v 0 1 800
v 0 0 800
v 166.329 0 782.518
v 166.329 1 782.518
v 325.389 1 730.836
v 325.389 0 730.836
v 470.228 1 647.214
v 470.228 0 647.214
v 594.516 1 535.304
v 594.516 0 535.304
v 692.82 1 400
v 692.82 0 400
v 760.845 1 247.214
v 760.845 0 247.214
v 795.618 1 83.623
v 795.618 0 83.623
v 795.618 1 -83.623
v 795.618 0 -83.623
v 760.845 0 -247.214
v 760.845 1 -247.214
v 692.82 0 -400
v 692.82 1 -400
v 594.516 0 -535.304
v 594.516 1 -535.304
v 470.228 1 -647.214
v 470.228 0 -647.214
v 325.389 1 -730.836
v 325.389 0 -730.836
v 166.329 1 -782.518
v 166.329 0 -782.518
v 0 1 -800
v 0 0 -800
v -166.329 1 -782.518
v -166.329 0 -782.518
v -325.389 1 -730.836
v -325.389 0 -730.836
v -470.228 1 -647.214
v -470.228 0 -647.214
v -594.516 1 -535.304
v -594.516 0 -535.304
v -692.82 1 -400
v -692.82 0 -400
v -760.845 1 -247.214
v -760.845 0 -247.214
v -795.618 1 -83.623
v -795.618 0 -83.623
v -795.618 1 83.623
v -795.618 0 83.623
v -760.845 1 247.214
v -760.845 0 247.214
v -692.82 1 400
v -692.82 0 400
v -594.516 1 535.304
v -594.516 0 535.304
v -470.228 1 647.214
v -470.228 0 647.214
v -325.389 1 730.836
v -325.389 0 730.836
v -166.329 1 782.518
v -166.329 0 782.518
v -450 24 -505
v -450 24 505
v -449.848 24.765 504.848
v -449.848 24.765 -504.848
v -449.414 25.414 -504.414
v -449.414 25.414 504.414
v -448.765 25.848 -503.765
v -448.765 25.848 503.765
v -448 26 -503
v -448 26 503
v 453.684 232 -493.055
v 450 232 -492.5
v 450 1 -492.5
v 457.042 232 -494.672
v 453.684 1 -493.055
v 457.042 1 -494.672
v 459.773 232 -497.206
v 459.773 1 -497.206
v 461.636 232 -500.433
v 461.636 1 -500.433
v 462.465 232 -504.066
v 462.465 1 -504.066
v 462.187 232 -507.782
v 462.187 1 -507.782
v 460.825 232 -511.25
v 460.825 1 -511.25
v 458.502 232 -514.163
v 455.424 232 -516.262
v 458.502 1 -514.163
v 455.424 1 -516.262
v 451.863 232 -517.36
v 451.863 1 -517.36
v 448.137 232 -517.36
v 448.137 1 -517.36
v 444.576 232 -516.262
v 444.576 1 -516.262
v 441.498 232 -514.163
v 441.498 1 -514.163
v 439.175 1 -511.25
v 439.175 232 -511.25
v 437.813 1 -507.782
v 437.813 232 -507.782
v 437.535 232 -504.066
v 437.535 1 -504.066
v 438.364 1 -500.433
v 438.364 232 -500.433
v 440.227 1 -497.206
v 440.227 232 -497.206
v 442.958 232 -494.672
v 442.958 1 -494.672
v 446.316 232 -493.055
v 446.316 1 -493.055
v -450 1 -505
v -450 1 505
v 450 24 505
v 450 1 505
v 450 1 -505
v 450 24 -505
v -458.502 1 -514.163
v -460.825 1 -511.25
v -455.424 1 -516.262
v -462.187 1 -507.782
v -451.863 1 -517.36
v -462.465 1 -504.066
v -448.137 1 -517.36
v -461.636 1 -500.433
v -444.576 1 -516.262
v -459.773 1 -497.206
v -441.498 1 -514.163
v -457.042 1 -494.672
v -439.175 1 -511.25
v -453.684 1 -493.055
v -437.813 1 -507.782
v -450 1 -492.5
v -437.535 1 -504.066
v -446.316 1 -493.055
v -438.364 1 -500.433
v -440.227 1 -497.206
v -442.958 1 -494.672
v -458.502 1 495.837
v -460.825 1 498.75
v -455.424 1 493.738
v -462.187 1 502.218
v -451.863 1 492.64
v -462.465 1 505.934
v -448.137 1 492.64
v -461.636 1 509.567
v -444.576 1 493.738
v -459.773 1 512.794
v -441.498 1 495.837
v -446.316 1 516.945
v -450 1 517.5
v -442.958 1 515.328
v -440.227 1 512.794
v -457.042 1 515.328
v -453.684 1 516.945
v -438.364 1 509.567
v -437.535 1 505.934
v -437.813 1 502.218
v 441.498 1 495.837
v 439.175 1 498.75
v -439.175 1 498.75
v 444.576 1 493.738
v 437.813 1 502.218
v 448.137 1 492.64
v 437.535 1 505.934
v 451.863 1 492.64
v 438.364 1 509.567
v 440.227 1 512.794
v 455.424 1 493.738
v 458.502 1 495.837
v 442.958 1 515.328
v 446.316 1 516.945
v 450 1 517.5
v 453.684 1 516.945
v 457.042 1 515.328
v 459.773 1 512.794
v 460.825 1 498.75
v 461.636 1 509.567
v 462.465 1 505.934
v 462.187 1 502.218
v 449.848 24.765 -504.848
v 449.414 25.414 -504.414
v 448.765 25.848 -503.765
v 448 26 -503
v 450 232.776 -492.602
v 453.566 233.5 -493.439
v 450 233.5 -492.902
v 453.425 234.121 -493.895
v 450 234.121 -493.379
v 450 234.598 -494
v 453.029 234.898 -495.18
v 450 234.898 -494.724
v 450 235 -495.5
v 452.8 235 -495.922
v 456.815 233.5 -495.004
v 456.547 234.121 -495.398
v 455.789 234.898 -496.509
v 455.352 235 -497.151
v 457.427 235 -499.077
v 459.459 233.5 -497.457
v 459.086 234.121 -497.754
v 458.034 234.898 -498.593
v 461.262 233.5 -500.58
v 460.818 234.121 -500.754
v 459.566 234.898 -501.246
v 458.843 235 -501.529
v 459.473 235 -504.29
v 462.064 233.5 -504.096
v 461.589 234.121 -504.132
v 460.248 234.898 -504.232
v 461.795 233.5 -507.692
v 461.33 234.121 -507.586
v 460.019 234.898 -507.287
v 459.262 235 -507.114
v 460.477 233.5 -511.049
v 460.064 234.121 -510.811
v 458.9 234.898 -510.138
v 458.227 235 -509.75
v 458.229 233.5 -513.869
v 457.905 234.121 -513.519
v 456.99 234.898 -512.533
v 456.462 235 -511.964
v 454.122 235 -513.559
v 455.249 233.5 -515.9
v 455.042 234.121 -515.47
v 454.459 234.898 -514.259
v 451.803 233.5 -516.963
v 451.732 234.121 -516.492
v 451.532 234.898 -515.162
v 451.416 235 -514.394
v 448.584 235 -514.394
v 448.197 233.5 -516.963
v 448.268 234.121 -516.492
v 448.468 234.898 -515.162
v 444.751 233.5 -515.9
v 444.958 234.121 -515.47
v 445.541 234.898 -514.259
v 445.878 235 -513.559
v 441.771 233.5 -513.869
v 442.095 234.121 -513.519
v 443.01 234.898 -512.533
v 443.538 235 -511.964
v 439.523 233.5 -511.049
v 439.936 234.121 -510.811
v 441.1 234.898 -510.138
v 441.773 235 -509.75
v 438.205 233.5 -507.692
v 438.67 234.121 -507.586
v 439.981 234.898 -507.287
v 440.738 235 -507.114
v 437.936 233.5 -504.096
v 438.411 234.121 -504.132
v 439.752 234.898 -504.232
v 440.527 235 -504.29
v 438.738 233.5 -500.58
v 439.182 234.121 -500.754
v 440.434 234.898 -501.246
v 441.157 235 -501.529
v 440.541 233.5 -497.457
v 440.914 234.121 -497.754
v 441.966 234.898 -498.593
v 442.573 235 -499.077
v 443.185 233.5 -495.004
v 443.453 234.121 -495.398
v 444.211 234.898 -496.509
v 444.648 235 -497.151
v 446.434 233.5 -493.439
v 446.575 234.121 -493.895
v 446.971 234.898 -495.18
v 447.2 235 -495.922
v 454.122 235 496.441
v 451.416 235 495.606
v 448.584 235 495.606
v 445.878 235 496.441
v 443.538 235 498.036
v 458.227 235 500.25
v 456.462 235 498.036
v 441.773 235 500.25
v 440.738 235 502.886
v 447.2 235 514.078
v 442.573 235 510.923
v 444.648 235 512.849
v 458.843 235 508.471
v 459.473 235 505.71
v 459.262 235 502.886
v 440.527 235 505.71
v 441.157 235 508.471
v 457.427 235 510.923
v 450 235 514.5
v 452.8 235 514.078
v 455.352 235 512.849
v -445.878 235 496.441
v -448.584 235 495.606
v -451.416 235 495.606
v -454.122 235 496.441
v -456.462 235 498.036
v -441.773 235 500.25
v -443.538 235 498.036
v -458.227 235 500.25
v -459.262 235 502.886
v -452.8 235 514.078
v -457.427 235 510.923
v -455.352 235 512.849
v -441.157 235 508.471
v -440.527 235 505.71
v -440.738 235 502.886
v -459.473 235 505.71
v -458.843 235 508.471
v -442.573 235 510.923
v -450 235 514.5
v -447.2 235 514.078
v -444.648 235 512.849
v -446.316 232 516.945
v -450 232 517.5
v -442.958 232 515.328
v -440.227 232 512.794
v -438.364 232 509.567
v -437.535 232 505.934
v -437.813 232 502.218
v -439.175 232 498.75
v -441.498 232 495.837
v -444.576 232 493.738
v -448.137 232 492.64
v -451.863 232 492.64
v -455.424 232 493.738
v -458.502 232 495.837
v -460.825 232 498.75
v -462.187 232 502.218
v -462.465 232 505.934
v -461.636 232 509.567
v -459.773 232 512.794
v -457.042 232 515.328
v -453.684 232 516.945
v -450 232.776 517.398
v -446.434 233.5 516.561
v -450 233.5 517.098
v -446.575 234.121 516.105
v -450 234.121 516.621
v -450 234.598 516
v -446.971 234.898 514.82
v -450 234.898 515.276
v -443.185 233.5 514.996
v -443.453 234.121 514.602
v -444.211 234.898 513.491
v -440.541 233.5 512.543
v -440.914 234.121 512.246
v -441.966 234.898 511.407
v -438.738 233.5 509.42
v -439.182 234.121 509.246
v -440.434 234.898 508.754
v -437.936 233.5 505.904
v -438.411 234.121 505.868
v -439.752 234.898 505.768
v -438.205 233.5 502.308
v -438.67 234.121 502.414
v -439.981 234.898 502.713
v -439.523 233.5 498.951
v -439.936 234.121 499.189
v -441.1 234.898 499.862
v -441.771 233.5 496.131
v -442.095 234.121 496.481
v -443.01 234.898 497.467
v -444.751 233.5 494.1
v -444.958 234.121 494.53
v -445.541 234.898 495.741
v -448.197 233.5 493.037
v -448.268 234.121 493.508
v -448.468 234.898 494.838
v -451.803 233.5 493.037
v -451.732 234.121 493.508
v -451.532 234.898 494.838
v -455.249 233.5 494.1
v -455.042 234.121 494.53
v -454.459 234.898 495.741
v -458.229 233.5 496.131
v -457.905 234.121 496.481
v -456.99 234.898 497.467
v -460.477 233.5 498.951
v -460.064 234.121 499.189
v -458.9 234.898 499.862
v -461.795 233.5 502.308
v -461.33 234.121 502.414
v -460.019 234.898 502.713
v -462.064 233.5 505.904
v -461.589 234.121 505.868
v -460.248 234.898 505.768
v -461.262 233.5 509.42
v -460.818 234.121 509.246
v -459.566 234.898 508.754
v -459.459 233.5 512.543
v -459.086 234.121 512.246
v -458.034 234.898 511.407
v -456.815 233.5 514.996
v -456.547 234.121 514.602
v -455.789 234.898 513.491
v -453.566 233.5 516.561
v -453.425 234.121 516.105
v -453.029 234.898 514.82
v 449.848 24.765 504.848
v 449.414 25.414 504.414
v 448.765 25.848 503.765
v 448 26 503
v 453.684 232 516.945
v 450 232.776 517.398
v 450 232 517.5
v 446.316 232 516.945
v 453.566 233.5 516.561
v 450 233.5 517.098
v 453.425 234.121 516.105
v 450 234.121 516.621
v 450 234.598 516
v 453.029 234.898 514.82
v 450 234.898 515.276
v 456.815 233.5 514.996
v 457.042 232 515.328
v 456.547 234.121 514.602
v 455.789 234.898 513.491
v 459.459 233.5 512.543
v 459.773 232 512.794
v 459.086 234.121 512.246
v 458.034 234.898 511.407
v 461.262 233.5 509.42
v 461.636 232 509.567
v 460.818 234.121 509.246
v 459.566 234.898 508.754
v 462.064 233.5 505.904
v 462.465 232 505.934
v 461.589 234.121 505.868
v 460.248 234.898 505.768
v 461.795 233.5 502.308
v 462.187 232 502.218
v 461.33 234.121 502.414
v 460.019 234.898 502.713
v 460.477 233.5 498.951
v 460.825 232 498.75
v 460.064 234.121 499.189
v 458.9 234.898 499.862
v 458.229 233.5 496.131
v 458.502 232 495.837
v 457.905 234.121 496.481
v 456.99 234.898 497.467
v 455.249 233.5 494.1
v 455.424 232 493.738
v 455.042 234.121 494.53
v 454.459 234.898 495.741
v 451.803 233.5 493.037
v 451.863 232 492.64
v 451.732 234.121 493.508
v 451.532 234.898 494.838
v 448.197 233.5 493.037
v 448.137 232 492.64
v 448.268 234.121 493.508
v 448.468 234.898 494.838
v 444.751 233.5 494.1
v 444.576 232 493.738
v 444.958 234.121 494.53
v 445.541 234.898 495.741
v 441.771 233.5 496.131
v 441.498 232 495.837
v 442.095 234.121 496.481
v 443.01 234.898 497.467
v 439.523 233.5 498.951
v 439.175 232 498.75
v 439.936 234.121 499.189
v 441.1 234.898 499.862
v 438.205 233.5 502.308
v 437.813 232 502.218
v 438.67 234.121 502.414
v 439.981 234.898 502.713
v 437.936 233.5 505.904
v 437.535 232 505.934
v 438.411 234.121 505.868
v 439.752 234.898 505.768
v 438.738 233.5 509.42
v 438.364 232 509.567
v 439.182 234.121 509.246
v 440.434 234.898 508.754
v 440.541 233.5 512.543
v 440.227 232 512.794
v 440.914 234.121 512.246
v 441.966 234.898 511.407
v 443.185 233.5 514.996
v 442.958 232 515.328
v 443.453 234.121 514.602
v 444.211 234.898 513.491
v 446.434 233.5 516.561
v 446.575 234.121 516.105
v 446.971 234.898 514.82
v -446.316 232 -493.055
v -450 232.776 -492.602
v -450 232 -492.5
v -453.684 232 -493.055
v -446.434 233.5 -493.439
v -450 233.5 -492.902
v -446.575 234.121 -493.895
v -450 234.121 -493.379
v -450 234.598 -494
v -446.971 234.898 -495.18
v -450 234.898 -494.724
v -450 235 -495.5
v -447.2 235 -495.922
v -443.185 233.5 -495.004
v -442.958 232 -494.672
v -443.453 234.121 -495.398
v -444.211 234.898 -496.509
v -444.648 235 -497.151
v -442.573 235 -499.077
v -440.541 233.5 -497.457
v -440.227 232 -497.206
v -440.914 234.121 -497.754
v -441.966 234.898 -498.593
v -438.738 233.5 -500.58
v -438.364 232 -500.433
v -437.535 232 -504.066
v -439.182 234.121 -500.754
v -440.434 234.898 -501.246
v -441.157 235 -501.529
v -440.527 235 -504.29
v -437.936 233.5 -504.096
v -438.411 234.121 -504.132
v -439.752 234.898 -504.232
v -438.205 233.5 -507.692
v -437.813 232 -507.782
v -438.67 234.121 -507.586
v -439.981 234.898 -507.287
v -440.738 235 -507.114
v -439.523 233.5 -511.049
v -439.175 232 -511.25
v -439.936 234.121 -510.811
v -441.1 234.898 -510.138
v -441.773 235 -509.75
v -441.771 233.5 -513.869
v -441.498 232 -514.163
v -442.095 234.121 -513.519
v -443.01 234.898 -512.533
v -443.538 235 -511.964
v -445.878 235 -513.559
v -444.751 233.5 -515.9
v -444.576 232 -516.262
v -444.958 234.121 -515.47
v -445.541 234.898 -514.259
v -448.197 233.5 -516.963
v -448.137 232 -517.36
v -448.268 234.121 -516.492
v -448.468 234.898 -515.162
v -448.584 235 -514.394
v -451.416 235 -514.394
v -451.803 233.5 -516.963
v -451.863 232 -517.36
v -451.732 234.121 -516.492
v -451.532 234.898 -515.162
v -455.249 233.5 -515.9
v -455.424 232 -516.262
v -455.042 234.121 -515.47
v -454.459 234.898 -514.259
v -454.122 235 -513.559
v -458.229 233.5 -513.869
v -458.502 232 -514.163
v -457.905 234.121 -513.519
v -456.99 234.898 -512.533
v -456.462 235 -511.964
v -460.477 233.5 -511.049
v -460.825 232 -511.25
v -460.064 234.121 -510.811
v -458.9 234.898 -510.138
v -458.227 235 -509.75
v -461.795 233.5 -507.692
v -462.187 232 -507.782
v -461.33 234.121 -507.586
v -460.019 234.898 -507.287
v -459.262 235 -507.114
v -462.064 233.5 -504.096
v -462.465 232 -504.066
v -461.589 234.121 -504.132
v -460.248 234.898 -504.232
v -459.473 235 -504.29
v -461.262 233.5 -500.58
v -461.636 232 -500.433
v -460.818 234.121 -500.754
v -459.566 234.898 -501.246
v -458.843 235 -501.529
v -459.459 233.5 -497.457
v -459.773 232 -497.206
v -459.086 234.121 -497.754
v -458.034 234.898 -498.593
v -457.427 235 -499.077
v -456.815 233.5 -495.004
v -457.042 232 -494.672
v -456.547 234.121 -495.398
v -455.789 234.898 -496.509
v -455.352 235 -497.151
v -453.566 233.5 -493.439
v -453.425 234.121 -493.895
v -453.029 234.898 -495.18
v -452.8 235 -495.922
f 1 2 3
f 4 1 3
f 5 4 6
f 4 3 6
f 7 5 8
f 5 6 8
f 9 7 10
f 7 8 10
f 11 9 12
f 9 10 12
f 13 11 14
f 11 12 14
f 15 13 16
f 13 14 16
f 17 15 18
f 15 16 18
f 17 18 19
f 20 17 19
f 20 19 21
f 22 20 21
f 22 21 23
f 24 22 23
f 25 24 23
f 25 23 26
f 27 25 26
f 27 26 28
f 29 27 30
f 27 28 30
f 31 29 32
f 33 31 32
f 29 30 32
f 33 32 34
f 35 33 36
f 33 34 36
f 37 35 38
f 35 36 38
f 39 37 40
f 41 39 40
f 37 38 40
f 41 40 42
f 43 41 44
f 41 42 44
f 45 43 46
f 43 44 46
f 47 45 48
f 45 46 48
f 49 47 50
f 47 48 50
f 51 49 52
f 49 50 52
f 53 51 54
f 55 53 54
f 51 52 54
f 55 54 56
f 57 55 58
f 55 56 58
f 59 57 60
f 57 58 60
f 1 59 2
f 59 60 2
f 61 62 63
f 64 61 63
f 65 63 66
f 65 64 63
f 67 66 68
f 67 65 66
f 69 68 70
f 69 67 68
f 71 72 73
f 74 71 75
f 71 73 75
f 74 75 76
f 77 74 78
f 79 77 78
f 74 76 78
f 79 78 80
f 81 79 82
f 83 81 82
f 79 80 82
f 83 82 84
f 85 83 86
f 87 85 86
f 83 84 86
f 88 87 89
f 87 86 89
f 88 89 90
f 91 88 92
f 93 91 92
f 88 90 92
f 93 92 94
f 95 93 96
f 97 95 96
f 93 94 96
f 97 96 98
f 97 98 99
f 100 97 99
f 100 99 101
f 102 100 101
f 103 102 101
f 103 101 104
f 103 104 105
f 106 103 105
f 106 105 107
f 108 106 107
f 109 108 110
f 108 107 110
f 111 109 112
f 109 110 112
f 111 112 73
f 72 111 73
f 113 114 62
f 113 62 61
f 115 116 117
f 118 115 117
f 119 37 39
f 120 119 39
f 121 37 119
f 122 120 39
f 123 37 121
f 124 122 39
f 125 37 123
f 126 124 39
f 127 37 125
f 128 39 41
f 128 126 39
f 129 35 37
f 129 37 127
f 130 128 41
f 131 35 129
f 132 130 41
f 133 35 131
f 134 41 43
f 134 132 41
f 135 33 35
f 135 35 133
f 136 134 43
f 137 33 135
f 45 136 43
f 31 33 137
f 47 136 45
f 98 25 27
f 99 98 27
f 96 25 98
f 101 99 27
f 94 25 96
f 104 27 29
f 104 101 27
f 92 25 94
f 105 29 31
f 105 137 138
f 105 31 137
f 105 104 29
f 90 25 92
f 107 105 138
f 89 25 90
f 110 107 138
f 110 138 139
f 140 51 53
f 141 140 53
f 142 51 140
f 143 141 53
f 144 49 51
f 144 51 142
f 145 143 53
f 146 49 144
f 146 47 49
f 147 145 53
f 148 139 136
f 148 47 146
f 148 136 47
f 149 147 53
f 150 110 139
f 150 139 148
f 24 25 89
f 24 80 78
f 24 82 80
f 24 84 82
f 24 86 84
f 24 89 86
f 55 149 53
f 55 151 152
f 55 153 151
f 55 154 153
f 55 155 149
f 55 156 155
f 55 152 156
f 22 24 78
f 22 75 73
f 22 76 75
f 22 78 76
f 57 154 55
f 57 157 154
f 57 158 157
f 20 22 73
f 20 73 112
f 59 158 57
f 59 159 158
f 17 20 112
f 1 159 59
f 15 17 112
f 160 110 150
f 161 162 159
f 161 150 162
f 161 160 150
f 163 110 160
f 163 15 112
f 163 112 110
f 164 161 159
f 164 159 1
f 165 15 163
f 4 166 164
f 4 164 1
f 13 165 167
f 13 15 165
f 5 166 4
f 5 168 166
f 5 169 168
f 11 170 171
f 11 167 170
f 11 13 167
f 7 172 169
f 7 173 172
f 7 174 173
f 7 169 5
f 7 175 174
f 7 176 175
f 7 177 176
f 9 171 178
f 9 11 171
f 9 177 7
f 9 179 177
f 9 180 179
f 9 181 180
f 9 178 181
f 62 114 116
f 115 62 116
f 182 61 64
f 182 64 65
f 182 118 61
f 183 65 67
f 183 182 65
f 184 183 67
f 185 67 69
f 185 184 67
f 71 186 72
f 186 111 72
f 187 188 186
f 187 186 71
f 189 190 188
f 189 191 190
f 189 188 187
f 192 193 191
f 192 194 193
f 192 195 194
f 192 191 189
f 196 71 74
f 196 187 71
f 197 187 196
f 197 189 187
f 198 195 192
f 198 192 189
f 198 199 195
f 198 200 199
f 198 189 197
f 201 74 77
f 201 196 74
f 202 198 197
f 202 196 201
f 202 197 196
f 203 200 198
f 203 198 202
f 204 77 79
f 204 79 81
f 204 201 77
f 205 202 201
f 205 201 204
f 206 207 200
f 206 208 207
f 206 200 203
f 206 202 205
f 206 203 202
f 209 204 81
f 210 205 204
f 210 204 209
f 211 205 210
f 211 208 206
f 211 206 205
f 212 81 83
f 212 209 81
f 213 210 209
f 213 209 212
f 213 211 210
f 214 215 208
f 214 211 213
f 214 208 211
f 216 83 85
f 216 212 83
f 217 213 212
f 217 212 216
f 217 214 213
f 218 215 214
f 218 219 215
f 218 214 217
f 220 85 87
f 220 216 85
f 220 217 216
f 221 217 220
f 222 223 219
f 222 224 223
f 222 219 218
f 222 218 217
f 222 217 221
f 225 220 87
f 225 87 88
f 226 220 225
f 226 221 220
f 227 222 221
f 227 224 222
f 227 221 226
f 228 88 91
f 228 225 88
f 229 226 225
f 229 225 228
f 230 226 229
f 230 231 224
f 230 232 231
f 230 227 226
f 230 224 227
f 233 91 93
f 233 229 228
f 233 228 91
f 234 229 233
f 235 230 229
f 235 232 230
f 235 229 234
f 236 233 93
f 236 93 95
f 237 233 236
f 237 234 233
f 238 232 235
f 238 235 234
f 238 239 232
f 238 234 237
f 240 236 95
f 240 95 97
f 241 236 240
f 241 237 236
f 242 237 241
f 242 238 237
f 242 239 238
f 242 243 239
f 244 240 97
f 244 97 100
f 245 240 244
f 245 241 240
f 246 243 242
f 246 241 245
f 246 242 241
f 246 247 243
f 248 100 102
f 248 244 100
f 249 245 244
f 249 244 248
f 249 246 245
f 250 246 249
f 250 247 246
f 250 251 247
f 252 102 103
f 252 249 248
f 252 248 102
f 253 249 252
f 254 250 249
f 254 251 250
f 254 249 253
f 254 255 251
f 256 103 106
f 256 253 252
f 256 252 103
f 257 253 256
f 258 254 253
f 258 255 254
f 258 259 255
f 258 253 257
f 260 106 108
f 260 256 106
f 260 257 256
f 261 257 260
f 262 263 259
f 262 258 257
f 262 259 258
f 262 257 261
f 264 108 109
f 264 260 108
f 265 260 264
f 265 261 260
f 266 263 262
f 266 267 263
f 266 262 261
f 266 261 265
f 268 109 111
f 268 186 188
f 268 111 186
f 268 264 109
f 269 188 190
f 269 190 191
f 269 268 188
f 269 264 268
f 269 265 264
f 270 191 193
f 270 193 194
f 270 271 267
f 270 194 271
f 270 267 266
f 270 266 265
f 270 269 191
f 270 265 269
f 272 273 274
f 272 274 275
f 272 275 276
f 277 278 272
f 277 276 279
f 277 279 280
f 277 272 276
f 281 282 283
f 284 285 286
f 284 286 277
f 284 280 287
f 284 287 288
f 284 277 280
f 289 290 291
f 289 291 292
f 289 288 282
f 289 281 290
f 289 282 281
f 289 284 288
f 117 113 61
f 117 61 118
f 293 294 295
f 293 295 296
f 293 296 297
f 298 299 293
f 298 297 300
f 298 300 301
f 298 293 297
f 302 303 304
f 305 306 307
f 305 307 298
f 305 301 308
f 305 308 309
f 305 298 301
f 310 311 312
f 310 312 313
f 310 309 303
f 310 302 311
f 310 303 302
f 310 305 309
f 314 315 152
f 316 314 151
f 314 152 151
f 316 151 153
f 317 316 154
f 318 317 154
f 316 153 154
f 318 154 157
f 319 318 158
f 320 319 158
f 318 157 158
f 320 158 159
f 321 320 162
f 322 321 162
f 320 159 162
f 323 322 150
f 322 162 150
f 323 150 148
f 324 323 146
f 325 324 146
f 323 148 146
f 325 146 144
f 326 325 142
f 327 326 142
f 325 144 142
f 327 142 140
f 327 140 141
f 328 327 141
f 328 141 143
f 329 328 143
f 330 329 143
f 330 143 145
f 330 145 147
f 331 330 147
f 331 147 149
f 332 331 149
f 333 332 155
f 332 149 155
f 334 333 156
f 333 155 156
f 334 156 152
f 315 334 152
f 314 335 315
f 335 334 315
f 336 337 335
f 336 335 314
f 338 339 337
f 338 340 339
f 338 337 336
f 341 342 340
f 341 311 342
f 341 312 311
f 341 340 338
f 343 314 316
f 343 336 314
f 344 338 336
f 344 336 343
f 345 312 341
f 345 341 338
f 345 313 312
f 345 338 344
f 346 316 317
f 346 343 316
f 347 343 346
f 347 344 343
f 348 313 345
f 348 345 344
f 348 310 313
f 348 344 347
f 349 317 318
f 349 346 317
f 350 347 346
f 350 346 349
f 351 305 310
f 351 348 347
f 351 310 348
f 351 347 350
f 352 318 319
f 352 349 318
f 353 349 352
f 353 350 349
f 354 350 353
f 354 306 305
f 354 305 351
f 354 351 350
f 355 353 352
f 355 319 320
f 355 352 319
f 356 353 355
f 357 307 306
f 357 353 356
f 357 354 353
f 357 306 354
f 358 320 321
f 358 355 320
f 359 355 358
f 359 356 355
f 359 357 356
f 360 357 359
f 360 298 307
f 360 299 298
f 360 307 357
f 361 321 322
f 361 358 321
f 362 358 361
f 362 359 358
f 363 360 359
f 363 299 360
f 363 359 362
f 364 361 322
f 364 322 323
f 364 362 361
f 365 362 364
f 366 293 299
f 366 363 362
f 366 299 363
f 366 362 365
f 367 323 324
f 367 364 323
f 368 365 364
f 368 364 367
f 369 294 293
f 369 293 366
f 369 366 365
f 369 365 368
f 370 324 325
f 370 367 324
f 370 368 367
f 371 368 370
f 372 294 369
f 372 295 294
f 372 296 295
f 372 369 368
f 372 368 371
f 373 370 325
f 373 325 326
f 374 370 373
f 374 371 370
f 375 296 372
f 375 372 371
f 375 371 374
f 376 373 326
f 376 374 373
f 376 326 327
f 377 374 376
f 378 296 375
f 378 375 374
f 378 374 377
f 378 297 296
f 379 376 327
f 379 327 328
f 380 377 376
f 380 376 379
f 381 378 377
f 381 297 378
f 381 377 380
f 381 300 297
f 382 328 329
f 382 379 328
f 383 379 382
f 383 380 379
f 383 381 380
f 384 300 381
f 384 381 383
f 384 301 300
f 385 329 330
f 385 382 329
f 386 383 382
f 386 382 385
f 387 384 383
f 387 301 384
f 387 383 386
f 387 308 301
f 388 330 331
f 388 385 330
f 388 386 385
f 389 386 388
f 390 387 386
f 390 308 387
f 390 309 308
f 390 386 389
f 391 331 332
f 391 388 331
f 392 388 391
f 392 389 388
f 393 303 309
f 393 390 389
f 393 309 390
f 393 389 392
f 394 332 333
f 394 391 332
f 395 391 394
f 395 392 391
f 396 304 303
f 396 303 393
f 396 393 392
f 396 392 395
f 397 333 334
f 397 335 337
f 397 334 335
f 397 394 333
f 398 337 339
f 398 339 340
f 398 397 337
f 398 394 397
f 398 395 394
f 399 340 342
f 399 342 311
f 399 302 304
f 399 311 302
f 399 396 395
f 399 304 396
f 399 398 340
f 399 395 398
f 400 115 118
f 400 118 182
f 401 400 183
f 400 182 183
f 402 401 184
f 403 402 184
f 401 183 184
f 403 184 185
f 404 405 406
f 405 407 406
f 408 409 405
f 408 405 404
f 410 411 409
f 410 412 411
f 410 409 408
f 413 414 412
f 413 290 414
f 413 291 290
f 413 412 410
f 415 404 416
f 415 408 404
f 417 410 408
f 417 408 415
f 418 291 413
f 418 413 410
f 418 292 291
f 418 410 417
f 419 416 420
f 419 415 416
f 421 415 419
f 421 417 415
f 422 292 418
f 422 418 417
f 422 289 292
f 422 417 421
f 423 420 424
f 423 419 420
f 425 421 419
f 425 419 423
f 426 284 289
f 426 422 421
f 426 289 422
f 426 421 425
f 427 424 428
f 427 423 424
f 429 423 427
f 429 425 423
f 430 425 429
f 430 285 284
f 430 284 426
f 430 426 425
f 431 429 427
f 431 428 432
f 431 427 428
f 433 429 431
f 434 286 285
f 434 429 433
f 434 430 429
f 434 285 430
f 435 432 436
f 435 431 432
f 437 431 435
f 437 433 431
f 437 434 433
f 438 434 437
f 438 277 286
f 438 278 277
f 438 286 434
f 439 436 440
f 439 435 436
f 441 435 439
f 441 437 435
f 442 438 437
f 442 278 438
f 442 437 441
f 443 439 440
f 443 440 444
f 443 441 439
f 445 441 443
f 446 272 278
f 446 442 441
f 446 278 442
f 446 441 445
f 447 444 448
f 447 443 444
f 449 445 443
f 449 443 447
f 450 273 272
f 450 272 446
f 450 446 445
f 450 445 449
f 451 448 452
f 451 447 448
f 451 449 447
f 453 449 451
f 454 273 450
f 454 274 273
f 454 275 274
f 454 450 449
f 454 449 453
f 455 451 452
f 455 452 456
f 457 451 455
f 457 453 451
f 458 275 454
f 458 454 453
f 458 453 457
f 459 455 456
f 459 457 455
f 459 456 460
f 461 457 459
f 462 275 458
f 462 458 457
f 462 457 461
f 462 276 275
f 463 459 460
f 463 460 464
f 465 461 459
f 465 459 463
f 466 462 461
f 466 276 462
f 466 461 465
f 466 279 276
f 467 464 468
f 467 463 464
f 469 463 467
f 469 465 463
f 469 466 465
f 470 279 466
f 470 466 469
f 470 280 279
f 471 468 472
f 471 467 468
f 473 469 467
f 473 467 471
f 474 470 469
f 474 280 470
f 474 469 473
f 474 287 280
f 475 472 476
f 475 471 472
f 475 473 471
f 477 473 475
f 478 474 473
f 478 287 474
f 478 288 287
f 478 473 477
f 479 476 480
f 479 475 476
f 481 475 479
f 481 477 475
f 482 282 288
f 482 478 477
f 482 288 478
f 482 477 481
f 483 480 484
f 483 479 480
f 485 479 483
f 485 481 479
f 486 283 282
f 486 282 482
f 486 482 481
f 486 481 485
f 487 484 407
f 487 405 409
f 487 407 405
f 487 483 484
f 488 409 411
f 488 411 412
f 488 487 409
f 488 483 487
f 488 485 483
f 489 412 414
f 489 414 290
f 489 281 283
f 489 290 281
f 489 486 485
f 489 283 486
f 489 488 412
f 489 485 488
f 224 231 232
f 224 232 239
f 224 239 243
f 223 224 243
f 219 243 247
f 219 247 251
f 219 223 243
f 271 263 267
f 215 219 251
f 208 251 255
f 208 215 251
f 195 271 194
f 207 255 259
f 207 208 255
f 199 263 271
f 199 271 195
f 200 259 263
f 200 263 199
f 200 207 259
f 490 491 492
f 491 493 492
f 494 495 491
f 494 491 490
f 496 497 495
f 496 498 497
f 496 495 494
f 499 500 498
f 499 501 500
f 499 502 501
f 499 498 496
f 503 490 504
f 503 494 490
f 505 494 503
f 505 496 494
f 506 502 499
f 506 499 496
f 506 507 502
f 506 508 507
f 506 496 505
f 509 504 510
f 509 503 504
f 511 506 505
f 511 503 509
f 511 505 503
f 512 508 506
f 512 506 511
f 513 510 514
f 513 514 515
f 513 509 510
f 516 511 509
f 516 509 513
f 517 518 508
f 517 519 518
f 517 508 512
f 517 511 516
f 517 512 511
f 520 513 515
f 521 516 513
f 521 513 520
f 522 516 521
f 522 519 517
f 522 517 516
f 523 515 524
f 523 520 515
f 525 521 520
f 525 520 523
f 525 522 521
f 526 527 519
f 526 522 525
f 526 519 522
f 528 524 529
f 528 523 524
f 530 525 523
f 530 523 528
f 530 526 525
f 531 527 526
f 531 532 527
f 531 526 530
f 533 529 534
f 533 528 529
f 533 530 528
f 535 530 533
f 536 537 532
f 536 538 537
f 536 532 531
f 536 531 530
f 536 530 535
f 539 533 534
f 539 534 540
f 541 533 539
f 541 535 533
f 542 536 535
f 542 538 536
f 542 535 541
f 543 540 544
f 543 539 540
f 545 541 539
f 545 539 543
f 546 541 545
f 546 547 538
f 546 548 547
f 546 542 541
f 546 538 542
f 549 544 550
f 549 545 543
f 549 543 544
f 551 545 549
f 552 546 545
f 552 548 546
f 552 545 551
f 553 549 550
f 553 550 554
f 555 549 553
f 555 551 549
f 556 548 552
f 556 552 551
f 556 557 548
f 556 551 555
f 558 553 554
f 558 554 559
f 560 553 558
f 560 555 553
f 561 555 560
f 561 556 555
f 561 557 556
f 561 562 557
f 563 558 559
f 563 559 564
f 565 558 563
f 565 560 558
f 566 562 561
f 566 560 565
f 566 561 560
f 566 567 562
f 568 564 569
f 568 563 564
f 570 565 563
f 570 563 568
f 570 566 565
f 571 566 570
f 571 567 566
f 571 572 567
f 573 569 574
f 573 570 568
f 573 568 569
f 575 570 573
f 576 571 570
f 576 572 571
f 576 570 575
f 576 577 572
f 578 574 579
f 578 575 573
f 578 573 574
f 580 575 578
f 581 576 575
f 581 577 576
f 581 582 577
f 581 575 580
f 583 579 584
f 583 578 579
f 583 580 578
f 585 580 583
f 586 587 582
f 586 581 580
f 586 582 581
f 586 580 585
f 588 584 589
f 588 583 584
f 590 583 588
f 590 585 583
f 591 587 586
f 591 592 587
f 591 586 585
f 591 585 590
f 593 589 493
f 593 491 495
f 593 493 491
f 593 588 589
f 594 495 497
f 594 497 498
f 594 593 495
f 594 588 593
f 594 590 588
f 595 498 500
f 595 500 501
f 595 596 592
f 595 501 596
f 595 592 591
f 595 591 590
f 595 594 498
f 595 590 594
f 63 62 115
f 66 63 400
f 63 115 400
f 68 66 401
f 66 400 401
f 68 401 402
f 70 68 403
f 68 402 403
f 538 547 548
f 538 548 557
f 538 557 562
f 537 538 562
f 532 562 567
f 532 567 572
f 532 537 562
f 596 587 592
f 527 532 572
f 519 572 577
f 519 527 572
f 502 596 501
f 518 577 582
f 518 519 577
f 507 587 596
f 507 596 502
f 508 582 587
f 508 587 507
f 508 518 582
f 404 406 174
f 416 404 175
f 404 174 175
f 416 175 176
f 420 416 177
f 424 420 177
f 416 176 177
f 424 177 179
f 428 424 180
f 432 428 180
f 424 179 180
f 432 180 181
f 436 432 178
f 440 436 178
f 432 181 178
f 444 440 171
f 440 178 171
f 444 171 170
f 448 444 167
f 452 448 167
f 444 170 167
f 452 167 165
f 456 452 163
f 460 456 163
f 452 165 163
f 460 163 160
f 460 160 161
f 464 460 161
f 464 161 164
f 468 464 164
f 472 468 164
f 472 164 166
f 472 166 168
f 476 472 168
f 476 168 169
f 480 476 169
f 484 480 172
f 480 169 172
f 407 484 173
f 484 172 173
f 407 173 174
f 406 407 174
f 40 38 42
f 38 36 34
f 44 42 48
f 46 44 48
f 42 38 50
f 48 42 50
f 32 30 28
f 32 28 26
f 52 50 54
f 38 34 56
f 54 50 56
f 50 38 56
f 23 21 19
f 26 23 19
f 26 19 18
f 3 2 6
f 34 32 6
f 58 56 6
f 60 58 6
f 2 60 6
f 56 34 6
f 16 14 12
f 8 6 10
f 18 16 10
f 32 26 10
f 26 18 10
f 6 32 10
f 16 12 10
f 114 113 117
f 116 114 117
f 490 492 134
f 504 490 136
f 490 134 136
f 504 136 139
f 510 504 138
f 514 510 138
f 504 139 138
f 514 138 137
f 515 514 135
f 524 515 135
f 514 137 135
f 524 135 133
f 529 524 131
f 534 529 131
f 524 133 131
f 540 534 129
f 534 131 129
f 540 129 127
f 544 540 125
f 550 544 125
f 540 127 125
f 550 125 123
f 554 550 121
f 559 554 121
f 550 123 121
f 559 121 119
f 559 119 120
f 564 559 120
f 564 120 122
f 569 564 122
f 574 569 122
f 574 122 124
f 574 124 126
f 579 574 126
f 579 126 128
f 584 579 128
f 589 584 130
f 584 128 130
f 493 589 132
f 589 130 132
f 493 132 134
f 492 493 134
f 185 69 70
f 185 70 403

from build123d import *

# Parameters (mm, degrees)
SKETCH1_R           = 800
BOSS_EXTRUDE1_DEPTH = 1
SKETCH2_W           = 900
SKETCH2_H           = 1010
BOSS_EXTRUDE2_DEPTH = 25
SKETCH3_R           = 12.5
BOSS_EXTRUDE3_DEPTH = 234
FILLET2_R           = 2
FILLET3_R           = 3


with BuildPart() as part:
    # Sketch1 → Boss-Extrude1 (new body)
    with BuildSketch(Plane(origin=(0, 0, 0), x_dir=(1, 0, 0), z_dir=(0, 1, 0))):
        with Locations(Location((0, 0, 0), (0, 0, 270))):
            Circle(SKETCH1_R)
    extrude(amount=BOSS_EXTRUDE1_DEPTH)

    # Sketch3 → Boss-Extrude3 (add)
    with BuildSketch(Plane(origin=(0, 1, 0), x_dir=(1, 0, 0), z_dir=(0, 1, 0))):
        with Locations(Location((-450, -505, 0), (0, 0, 270))):
            Circle(SKETCH3_R)
        with Locations(Location((450, -505, 0), (0, 0, 270))):
            Circle(SKETCH3_R)
        with Locations(Location((450, 505, 0), (0, 0, 270))):
            Circle(SKETCH3_R)
        with Locations(Location((-450, 505, 0), (0, 0, 270))):
            Circle(SKETCH3_R)
    extrude(amount=BOSS_EXTRUDE3_DEPTH)

    # Fillet3
    fillet3_edges = [part.edges().sort_by_distance(p)[0] for p in [
        (450, 235, -517.5),
        (-450, 235, -517.5),
        (-450, 235, 492.5),
        (450, 235, 492.5),
    ]]
    fillet(fillet3_edges, radius=FILLET3_R)


with BuildPart() as body_2:
    # Sketch2 → Boss-Extrude2 (new body)
    with BuildSketch(Plane(origin=(0, 1, 0), x_dir=(1, 0, 0), z_dir=(0, 1, 0))):
        Rectangle(SKETCH2_W, SKETCH2_H)
    extrude(amount=BOSS_EXTRUDE2_DEPTH)

    # Fillet2
    fillet2_edges = [body_2.edges().sort_by_distance(p)[0] for p in [
        (-450, 26, 0),
        (0, 26, 505),
        (450, 26, 0),
        (0, 26, -505),
    ]]
    fillet(fillet2_edges, radius=FILLET2_R)


solid = Compound([part.part, body_2.part])
